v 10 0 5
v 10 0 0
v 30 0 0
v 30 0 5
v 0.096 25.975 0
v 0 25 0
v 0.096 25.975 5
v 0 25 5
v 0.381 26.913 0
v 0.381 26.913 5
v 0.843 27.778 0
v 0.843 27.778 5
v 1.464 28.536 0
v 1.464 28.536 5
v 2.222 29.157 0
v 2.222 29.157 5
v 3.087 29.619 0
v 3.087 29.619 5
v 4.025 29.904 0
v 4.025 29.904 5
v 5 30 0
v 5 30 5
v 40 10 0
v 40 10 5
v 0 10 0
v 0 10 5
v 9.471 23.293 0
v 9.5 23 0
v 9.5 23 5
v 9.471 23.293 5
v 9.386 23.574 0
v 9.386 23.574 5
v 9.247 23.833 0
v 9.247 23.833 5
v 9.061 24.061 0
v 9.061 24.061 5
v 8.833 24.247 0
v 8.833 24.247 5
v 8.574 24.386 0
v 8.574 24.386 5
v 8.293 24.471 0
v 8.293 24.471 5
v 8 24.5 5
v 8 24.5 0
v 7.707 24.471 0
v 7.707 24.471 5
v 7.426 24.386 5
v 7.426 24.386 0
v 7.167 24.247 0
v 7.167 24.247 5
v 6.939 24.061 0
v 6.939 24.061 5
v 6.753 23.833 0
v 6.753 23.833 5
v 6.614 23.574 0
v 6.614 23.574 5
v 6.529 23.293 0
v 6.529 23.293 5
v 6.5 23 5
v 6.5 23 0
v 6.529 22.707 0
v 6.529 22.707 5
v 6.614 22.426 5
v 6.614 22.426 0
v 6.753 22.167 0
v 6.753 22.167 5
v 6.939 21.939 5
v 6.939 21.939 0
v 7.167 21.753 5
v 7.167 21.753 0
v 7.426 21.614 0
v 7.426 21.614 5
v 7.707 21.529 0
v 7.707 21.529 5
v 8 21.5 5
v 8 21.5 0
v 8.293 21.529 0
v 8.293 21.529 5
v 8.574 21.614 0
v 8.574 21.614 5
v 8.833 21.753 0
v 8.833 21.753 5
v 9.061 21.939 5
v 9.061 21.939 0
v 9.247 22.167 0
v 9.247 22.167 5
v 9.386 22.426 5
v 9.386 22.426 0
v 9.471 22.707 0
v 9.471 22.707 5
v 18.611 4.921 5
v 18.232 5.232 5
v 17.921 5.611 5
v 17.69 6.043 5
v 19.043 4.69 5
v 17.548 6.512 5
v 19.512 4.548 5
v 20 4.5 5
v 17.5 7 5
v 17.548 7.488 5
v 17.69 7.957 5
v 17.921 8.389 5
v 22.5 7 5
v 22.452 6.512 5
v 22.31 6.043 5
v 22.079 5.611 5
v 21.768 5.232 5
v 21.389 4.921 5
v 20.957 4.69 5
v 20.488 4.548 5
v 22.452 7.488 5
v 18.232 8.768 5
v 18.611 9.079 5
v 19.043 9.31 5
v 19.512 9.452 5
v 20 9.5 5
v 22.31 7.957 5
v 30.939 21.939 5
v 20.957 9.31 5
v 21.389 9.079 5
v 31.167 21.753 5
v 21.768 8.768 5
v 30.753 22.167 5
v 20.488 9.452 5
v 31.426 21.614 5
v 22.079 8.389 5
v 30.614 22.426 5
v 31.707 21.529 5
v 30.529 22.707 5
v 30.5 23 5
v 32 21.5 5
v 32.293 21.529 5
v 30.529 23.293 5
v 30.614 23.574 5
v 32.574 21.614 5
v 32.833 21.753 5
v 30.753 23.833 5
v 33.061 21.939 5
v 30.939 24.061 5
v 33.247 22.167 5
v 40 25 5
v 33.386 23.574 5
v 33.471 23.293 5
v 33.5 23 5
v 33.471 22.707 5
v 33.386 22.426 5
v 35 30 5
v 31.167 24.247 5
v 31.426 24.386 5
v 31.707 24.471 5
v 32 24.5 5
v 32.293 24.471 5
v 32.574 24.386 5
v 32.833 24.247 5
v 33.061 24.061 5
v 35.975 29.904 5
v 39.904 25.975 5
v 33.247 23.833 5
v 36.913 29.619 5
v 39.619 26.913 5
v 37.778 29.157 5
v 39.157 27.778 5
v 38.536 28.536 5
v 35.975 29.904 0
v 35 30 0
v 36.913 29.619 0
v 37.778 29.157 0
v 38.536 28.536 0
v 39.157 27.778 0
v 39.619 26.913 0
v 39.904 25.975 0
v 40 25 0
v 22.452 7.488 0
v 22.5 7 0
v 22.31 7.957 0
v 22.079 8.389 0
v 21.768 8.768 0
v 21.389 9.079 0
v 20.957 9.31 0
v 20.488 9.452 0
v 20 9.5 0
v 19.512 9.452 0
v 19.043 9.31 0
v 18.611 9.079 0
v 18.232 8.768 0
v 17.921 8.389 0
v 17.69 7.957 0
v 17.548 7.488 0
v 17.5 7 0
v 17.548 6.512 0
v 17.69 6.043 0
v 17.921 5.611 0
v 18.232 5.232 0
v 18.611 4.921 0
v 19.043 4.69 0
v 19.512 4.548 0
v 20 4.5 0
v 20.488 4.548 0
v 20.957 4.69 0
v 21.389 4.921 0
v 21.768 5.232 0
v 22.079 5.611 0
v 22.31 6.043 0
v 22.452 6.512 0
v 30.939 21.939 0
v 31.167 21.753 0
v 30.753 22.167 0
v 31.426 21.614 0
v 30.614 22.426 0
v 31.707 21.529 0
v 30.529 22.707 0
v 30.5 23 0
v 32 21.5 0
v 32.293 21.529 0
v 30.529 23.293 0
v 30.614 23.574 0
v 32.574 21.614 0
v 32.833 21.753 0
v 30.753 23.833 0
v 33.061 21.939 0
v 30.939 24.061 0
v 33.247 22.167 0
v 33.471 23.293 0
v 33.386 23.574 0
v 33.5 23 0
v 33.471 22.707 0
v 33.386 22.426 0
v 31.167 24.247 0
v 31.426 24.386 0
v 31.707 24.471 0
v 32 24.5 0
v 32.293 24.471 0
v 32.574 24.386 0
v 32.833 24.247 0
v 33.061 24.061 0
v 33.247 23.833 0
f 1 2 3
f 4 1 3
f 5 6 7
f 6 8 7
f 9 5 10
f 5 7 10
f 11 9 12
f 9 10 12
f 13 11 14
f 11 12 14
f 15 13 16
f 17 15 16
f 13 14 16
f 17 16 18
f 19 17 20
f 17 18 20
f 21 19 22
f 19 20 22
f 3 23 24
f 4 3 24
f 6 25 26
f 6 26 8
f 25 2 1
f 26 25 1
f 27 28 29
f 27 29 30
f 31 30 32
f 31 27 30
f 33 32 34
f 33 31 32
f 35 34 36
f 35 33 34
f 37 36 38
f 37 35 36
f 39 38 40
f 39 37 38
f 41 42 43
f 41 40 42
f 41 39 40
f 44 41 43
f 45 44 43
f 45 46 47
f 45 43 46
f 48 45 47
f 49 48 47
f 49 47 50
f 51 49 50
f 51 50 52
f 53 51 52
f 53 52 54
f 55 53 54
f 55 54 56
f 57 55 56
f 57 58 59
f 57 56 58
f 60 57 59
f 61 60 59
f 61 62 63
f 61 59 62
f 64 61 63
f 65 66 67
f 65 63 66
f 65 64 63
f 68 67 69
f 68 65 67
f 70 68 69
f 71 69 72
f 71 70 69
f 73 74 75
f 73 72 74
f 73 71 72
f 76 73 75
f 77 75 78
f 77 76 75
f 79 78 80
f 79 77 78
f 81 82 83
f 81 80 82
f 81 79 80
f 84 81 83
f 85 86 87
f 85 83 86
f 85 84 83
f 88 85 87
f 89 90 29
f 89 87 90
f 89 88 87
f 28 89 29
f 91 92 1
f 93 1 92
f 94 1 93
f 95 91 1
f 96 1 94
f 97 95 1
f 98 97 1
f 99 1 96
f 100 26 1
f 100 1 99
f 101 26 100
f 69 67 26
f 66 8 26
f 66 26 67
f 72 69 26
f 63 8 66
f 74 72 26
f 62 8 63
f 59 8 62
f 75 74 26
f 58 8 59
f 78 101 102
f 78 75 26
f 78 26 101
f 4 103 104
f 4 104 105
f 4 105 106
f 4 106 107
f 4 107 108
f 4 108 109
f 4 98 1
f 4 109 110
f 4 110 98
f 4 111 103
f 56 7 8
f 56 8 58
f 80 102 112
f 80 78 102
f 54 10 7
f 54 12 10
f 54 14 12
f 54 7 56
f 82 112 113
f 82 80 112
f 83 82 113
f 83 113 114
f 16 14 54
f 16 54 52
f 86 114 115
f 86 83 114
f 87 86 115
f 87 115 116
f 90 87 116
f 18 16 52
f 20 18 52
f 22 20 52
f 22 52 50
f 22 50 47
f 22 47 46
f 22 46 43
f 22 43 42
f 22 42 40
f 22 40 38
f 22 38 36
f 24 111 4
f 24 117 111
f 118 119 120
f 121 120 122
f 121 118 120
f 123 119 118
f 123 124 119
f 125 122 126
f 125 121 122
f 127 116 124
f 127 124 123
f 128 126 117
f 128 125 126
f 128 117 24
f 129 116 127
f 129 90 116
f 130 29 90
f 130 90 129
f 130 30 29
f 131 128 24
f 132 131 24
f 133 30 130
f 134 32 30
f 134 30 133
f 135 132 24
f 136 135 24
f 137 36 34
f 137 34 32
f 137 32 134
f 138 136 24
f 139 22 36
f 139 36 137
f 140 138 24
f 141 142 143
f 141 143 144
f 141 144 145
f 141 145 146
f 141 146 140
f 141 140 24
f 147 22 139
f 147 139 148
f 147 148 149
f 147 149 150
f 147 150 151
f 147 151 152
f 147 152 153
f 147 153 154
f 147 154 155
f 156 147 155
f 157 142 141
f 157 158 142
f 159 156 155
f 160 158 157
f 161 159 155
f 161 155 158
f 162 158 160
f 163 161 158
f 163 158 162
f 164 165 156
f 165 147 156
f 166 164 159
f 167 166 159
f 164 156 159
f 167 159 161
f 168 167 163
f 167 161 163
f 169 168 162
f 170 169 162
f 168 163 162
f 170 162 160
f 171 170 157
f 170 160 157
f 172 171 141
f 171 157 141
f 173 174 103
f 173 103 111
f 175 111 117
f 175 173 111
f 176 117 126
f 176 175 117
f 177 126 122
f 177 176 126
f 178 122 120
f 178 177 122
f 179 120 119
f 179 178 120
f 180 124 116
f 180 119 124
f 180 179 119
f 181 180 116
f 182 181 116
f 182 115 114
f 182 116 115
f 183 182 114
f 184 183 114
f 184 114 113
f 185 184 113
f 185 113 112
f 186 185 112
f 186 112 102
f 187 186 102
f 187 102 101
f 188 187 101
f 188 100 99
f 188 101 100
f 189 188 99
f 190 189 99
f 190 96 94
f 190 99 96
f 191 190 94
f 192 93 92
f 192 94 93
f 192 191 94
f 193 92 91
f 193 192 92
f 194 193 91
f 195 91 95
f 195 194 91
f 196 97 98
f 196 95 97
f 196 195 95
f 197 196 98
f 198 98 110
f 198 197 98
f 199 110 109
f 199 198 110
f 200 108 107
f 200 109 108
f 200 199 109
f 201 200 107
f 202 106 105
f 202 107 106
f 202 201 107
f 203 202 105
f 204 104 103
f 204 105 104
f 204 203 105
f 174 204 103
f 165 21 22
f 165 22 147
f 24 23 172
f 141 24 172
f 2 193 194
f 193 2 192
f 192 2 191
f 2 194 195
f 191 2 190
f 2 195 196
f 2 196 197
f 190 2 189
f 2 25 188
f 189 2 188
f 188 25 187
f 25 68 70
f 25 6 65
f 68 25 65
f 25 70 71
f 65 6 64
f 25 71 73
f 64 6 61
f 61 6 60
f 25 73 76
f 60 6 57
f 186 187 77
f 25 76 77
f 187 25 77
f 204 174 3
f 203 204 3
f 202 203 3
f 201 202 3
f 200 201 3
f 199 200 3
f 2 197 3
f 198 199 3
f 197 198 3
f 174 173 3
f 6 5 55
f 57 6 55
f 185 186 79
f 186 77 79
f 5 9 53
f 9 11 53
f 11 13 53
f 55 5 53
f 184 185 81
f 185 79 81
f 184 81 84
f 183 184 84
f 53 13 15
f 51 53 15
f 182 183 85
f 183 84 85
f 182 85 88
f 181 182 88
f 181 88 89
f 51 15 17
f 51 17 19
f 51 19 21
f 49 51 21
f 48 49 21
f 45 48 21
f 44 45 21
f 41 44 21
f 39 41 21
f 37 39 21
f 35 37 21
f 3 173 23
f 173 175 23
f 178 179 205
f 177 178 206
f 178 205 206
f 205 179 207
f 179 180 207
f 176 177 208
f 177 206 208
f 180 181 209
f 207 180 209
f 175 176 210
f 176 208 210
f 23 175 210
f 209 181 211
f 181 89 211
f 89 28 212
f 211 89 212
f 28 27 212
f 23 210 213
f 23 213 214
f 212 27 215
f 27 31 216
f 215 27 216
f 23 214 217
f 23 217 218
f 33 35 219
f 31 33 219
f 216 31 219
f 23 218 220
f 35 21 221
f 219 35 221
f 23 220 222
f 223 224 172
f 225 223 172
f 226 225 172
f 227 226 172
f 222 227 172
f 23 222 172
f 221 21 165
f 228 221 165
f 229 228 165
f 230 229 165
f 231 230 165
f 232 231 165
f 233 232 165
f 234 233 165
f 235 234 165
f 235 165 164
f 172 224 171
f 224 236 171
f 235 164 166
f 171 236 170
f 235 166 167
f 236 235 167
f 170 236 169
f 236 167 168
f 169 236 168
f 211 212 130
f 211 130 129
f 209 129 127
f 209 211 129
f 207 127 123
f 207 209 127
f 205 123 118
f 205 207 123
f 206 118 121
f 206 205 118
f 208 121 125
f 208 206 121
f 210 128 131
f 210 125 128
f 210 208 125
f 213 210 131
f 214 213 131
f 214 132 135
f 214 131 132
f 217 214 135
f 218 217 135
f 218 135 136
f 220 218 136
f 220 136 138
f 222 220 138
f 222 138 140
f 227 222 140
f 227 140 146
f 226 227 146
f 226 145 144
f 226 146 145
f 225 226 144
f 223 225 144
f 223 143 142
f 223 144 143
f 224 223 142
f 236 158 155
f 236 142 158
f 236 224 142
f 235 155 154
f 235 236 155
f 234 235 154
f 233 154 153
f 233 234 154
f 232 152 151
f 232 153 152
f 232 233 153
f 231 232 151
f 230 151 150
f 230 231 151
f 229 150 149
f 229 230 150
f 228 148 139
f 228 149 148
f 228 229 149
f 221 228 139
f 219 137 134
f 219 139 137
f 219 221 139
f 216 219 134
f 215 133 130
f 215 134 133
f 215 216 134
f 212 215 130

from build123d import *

# Parameters (mm, degrees)
ESQUISSE1_W                  = 40
ESQUISSE1_H                  = 30
BOSS_EXTRU_1_DEPTH           = 5
ENL_V_MAT_EXTRU_1_DEPTH      = 51.249378106
ENL_V_MAT_EXTRU_1_DEPTH_BACK = 51.249378106
ESQUISSE2_R                  = 1.5
ESQUISSE2_R_2                = 2.5
CHANFREIN1_SIZE              = 10
CONG_1_R                     = 5


with BuildPart() as part:
    # Esquisse1 → Boss.-Extru.1 (new body)
    with BuildSketch(Plane.XY):
        with Locations((20, 15)):
            Rectangle(ESQUISSE1_W, ESQUISSE1_H)
    extrude(amount=BOSS_EXTRU_1_DEPTH)

    # Esquisse2 → Enlèv. mat.-Extru.1 (cut, two sides: drawn at the far end of the back side and taken through both)
    with BuildSketch(Plane.XY.offset(5).offset(-ENL_V_MAT_EXTRU_1_DEPTH_BACK)):
        with Locations((8, 23)):
            Circle(ESQUISSE2_R)
        with Locations(Location((32, 23, 0), (0, 0, 180))):
            Circle(ESQUISSE2_R)
        with Locations((20, 7)):
            Circle(ESQUISSE2_R_2)
    extrude(amount=ENL_V_MAT_EXTRU_1_DEPTH + ENL_V_MAT_EXTRU_1_DEPTH_BACK, mode=Mode.SUBTRACT)

    # Chanfrein1
    chanfrein1_edges = [part.edges().sort_by_distance(p)[0] for p in [
        (40, 0, 2.5),
        (0, 0, 2.5),
    ]]
    chamfer(chanfrein1_edges, length=CHANFREIN1_SIZE)

    # Congé1
    cong_1_edges = [part.edges().sort_by_distance(p)[0] for p in [
        (0, 30, 2.5),
        (40, 30, 2.5),
    ]]
    fillet(cong_1_edges, radius=CONG_1_R)


solid = part.part
